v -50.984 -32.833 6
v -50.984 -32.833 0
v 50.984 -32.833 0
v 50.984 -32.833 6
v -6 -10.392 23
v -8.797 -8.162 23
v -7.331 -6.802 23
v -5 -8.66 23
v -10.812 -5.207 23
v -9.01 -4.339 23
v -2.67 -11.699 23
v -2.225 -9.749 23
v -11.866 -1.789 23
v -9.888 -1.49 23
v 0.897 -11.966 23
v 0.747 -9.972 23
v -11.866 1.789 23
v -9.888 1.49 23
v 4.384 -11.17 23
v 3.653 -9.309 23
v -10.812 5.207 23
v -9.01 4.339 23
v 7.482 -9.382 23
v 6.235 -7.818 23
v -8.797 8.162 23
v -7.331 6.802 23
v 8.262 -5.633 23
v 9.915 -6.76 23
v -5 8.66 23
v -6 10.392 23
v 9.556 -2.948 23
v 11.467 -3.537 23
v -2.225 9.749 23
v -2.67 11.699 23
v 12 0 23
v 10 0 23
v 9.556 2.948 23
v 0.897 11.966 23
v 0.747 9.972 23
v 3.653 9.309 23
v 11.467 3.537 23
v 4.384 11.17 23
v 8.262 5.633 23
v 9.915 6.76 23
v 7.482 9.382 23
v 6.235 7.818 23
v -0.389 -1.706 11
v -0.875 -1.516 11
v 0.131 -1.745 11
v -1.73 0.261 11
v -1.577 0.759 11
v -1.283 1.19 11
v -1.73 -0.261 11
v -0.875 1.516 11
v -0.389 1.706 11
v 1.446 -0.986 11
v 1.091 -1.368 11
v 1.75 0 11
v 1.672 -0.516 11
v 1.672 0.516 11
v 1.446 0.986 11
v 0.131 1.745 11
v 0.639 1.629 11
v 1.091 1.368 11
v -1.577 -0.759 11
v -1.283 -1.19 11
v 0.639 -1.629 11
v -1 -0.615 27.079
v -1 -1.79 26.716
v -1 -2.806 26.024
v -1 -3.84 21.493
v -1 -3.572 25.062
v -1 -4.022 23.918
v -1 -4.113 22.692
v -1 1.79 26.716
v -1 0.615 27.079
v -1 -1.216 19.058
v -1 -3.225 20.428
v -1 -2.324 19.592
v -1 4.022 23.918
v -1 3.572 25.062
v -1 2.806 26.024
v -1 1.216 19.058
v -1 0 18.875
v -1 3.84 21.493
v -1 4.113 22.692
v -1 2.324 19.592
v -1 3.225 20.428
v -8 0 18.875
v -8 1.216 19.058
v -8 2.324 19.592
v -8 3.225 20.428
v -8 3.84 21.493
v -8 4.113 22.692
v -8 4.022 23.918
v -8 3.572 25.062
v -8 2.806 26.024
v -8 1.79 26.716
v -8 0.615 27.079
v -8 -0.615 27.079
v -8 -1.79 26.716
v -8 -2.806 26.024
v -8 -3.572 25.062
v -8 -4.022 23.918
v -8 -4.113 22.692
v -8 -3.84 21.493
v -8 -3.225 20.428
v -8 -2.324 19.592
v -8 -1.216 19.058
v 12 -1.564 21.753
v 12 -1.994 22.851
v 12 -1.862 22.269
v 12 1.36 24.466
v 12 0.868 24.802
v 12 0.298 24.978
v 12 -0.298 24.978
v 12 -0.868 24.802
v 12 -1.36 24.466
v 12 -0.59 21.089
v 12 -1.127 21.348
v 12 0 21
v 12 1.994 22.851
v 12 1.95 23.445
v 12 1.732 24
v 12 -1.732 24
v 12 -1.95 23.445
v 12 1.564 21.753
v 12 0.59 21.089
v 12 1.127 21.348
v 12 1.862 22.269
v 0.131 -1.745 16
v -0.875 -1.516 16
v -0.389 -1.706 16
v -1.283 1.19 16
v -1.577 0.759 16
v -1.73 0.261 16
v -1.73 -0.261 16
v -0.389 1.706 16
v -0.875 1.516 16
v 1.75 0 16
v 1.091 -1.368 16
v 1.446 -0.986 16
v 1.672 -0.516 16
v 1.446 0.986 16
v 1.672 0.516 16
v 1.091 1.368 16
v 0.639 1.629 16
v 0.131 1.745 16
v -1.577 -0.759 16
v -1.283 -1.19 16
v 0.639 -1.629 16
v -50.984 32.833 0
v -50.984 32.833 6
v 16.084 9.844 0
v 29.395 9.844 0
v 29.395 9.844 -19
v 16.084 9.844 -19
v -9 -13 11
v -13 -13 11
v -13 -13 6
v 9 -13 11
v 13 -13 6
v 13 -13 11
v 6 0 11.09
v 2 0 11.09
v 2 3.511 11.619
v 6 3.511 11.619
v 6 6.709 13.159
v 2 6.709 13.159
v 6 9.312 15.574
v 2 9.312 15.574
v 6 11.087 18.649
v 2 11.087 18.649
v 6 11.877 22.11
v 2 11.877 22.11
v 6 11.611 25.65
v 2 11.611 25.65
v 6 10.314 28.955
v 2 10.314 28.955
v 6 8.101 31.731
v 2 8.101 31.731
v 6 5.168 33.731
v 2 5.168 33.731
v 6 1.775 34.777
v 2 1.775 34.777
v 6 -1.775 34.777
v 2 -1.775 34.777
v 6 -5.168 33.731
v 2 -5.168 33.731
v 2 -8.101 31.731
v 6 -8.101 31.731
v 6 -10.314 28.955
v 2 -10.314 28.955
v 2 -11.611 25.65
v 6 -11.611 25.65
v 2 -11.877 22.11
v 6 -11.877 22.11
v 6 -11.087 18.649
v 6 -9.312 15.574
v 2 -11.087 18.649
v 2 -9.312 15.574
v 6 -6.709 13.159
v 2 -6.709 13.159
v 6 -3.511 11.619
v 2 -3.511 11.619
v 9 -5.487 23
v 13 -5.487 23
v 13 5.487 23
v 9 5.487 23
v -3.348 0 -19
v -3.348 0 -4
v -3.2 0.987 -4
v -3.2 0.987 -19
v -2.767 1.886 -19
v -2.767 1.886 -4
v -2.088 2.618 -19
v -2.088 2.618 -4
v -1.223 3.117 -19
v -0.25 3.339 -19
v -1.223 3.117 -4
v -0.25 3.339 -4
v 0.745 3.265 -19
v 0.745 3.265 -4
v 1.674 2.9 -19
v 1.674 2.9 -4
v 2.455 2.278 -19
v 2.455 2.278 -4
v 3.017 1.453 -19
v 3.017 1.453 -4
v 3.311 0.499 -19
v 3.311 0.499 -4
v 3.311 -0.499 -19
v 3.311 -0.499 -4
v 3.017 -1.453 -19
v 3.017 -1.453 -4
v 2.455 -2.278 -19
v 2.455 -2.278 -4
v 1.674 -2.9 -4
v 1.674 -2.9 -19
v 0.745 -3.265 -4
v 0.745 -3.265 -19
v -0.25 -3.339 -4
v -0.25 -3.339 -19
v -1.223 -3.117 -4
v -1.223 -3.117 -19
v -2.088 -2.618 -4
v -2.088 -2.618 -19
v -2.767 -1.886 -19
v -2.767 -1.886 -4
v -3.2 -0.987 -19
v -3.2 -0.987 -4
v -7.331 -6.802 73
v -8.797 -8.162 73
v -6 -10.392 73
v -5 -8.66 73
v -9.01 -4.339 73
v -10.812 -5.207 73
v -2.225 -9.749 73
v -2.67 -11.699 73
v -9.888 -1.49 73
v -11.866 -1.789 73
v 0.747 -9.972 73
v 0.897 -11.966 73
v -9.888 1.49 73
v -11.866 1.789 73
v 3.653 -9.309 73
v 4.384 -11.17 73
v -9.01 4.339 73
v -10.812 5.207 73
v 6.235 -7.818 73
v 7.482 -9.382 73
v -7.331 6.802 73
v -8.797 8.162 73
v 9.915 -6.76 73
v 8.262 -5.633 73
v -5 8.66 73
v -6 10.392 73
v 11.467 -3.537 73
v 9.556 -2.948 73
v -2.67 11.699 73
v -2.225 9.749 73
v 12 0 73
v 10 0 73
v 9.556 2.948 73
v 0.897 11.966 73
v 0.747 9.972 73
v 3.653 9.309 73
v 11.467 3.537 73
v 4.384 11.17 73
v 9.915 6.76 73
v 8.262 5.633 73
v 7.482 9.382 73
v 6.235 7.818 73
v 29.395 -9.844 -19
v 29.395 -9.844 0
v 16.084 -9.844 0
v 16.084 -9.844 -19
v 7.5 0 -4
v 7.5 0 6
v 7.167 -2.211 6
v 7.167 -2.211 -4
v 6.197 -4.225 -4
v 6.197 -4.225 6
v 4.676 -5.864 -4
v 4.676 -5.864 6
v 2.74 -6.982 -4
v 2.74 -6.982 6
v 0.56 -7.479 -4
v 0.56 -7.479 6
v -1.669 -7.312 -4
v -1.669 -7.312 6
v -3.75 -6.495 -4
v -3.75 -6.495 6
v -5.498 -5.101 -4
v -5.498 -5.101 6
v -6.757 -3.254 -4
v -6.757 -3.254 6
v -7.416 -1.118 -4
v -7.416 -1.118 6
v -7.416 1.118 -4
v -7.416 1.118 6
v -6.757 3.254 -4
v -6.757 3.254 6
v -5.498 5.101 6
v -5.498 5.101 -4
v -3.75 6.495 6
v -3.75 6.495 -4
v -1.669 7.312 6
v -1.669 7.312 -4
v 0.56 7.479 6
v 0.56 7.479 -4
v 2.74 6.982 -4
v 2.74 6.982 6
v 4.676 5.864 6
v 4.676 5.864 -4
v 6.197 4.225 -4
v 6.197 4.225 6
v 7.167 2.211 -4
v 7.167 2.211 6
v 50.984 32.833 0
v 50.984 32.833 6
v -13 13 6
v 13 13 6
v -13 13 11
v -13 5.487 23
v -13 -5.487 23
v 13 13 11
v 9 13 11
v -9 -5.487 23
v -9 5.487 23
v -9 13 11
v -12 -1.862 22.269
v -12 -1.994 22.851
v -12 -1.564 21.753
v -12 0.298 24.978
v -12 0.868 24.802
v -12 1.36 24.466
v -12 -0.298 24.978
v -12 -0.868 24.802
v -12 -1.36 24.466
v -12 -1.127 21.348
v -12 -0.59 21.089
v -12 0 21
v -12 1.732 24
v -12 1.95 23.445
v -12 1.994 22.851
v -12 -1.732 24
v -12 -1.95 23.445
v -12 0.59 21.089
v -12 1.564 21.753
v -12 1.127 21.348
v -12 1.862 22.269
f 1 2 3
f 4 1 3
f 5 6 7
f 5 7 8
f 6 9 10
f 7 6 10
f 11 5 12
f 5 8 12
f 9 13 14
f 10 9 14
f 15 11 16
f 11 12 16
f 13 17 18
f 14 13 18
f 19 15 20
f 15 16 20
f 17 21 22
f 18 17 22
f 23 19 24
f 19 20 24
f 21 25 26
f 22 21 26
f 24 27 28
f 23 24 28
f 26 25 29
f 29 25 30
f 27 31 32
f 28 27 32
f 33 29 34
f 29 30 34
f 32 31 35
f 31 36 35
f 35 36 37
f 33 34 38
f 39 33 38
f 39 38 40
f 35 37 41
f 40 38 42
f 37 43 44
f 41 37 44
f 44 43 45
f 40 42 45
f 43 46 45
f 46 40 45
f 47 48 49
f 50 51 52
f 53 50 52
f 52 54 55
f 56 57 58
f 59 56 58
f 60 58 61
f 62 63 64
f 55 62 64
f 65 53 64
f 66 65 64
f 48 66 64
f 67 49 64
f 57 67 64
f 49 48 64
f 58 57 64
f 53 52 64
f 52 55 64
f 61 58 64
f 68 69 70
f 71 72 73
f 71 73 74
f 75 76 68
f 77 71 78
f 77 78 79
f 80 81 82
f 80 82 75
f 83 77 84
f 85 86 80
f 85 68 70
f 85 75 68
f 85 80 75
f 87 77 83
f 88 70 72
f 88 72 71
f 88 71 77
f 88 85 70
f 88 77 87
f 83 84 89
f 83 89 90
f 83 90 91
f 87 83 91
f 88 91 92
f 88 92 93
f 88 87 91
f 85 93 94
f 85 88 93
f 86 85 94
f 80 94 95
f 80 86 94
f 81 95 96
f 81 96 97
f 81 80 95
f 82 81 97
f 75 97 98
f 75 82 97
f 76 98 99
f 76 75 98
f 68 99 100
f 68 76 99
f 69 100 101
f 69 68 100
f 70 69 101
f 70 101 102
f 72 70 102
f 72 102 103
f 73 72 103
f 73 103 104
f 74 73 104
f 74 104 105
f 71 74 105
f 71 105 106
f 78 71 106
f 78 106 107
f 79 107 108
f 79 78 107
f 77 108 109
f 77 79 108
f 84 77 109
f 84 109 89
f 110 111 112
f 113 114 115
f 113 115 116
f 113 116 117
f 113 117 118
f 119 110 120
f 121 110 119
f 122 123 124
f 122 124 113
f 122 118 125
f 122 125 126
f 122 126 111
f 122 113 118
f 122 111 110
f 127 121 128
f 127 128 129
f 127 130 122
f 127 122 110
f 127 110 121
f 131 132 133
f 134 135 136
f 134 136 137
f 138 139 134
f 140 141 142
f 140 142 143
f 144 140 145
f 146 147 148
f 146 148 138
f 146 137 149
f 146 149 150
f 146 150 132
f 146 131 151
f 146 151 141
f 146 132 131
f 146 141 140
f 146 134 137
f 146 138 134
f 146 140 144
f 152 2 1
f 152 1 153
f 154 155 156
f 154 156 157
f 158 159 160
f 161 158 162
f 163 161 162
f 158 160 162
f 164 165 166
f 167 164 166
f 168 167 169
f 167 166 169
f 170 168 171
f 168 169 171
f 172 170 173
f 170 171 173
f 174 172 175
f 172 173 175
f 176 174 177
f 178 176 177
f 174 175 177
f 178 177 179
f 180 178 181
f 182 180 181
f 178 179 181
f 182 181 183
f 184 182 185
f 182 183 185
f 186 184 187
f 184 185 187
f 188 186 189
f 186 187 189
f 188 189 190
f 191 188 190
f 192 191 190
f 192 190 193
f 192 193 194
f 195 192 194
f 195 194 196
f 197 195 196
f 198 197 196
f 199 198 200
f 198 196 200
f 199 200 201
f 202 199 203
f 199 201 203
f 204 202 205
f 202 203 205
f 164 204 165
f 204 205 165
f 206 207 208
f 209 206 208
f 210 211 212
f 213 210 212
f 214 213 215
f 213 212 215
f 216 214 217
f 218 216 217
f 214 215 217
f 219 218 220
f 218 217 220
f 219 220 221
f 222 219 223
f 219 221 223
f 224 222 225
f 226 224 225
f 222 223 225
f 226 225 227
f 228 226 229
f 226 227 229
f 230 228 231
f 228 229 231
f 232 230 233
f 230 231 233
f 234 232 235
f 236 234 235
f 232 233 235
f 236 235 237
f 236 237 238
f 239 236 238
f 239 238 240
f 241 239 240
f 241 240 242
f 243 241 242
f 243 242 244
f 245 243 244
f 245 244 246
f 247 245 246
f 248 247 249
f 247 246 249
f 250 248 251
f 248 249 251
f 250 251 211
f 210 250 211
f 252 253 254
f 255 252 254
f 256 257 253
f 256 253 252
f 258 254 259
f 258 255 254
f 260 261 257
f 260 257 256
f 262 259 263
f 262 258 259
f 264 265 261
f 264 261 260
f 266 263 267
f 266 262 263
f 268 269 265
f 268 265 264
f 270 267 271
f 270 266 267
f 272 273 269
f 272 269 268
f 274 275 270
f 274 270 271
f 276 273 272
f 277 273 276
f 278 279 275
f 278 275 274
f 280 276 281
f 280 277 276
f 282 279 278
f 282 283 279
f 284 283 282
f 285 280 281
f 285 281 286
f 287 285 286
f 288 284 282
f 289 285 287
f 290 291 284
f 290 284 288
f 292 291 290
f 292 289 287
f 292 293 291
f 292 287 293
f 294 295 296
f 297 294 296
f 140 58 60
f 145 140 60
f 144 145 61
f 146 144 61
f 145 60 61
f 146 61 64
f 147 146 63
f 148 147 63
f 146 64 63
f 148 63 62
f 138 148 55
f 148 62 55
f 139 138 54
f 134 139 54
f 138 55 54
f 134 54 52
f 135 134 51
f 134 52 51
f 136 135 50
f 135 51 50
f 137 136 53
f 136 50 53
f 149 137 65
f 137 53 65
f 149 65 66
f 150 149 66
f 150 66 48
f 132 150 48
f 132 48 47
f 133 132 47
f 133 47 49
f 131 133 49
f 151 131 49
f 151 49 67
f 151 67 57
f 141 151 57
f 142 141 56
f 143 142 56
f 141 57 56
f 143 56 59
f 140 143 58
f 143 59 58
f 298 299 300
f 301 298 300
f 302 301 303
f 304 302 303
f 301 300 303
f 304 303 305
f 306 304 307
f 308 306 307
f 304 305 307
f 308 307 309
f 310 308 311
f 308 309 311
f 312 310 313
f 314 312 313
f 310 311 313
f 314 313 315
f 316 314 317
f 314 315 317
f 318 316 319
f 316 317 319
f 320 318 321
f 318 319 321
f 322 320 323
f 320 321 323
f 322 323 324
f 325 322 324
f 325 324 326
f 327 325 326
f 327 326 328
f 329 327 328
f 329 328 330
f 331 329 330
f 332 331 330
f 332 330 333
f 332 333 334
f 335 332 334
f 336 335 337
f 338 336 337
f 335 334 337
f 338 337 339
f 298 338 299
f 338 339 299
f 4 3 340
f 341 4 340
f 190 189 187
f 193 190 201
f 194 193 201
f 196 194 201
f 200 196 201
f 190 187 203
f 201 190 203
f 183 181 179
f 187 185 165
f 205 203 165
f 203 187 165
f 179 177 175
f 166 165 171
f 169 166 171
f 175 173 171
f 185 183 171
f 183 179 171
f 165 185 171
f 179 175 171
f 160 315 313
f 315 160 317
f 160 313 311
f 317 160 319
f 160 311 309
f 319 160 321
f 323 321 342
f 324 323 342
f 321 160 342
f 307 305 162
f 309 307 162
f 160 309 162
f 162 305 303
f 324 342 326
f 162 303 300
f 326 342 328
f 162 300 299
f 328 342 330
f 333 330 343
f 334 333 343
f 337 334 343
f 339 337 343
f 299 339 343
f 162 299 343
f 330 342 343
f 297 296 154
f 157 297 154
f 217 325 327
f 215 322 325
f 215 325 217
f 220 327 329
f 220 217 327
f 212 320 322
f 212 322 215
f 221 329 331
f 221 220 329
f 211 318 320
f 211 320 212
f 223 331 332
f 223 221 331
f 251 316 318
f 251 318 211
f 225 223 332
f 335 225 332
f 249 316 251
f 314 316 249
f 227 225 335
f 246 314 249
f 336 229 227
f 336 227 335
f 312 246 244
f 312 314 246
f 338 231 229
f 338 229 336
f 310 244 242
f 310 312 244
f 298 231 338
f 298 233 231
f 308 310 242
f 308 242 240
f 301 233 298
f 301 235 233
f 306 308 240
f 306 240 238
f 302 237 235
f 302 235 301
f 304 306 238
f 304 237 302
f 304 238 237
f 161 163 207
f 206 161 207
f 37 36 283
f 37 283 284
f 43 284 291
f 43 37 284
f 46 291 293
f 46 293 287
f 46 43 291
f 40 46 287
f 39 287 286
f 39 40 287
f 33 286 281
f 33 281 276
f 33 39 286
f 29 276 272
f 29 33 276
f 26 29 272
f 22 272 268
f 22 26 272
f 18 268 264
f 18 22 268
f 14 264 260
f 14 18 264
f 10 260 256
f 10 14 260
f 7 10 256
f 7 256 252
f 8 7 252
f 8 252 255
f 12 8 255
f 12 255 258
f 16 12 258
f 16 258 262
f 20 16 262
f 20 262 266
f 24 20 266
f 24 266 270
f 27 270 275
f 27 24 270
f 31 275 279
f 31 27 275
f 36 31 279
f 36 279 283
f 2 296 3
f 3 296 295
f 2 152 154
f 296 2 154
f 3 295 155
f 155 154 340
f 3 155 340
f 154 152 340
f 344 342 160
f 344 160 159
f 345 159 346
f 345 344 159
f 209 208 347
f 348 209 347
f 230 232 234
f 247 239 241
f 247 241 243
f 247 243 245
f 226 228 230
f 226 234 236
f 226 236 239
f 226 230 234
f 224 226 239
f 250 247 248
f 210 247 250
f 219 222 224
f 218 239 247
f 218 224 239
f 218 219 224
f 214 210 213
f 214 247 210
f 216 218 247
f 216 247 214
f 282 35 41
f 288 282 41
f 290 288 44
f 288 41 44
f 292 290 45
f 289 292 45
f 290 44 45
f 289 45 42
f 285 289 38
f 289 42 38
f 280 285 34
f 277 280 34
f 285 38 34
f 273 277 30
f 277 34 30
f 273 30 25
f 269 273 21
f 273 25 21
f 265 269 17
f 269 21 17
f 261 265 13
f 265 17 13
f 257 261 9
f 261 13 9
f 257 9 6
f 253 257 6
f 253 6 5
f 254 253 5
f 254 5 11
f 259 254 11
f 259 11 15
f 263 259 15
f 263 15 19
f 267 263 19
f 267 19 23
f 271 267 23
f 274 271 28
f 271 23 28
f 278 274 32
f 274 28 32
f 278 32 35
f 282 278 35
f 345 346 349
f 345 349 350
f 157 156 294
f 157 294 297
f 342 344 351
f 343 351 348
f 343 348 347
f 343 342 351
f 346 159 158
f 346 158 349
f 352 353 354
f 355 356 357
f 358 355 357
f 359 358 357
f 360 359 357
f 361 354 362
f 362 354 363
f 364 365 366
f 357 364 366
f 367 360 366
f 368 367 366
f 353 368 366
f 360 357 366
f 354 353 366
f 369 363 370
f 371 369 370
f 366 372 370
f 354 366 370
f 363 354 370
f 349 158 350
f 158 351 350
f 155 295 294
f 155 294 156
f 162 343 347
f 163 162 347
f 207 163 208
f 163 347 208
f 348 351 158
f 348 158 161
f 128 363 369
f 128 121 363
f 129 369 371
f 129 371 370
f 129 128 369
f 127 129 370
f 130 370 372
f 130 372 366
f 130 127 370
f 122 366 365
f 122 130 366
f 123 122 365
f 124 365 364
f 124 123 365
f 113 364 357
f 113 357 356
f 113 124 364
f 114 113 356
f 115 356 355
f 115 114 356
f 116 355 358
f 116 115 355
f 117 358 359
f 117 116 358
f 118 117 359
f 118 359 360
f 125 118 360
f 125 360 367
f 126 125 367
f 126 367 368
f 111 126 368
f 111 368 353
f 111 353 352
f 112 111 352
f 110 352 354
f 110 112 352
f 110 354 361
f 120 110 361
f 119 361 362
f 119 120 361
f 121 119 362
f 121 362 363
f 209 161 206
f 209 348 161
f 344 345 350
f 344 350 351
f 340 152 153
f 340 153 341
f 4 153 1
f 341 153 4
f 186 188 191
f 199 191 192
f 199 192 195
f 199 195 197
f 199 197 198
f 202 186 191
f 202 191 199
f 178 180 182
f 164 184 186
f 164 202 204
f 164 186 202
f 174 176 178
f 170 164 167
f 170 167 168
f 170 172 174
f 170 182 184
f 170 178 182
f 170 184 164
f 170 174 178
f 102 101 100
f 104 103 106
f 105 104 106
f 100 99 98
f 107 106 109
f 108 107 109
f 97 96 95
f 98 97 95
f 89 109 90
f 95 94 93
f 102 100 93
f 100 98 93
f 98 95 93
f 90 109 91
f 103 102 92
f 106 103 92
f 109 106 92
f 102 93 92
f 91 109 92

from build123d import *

# Parameters (mm, degrees)
SKETCH4_W            = 101.967936368
SKETCH4_H            = 65.666060288
BOSS_EXTRUDE4_DEPTH  = 6
SKETCH5_W            = 26
SKETCH5_H            = 26
BOSS_EXTRUDE5_DEPTH  = 5
BOSS_EXTRUDE6_DEPTH  = 4
SKETCH7_R            = 12
SKETCH7_R_2          = 10
EXTRUDE_THIN1_DEPTH  = 50
SKETCH8_R            = 1.75
BOSS_EXTRUDE7_DEPTH  = 5
BOSS_EXTRUDE8_START  = 2
SKETCH10_R           = 11.91
BOSS_EXTRUDE8_DEPTH  = 4
SKETCH11_R           = 2
BOSS_EXTRUDE9_DEPTH  = 12
SKETCH13_R           = 7.5
BOSS_EXTRUDE11_DEPTH = 10
BOSS_EXTRUDE12_START = -1
SKETCH14_R           = 4.125
BOSS_EXTRUDE12_DEPTH = 7
SKETCH15_R           = 3.348476615
BOSS_EXTRUDE13_DEPTH = 15
SKETCH16_W           = 13.310717663
SKETCH16_H           = 19.688769876
BOSS_EXTRUDE14_DEPTH = 19


with BuildPart() as part:
    # Sketch4 → Boss-Extrude4 (new body)
    with BuildSketch(Plane.XY):
        Rectangle(SKETCH4_W, SKETCH4_H)
    extrude(amount=BOSS_EXTRUDE4_DEPTH)

    # Sketch16 → Boss-Extrude14 (add)
    with BuildSketch(Plane(origin=(0, 0, 0), x_dir=(-1, 0, 0), z_dir=(0, 0, -1))):
        with Locations((-22.739142675, 0)):
            Rectangle(SKETCH16_W, SKETCH16_H)
    extrude(amount=BOSS_EXTRUDE14_DEPTH)


with BuildPart() as body_2:
    # Sketch5 → Boss-Extrude5 (new body)
    with BuildSketch(Plane.XY.offset(6)):
        Rectangle(SKETCH5_W, SKETCH5_H)
    extrude(amount=BOSS_EXTRUDE5_DEPTH)

    # Sketch6 → Boss-Extrude6 (add)
    with BuildSketch(Plane(origin=(13, 0, 0), x_dir=(0, 0, -1), z_dir=(1, 0, 0))):
        Polygon((-11, -13), (-23, -5.486969756), (-23, 5.486969756), (-11, 13), align=None)
    boss_extrude6 = extrude(amount=-BOSS_EXTRUDE6_DEPTH)

    # Mirror1: Boss-Extrude6 across plane
    add(boss_extrude6.mirror(Plane(origin=(0, 0, 0), x_dir=(0, 0, 1), z_dir=(1, 0, 0))))

    # Sketch13 → Boss-Extrude11 (add)
    with BuildSketch(Plane(origin=(0, 0, 6), x_dir=(-1, 0, 0), z_dir=(0, 0, -1))):
        with Locations(Location((0, 0, 0), (0, 0, 180))):
            Circle(SKETCH13_R)
    extrude(amount=BOSS_EXTRUDE11_DEPTH)

    # Sketch15 → Boss-Extrude13 (add)
    with BuildSketch(Plane(origin=(0, 0, -4), x_dir=(-1, 0, 0), z_dir=(0, 0, -1))):
        Circle(SKETCH15_R)
    extrude(amount=BOSS_EXTRUDE13_DEPTH)


with BuildPart() as body_3:
    # Sketch7 → Extrude-Thin1 (new body)
    with BuildSketch(Plane.XY.offset(23)):
        Circle(SKETCH7_R)
        Circle(SKETCH7_R_2, mode=Mode.SUBTRACT)
    extrude(amount=EXTRUDE_THIN1_DEPTH)


with BuildPart() as body_4:
    # Sketch8 → Boss-Extrude7 (new body)
    with BuildSketch(Plane.XY.offset(11)):
        Circle(SKETCH8_R)
    extrude(amount=BOSS_EXTRUDE7_DEPTH)


with BuildPart() as body_5:
    # Sketch10 → Boss-Extrude8 (new body)
    with BuildSketch(Plane(origin=(0, 0, 0), x_dir=(0, 0, -1), z_dir=(1, 0, 0)).offset(BOSS_EXTRUDE8_START)):
        with Locations((-23, 0)):
            Circle(SKETCH10_R)
    extrude(amount=BOSS_EXTRUDE8_DEPTH)


with BuildPart() as body_6:
    # Sketch11 → Boss-Extrude9 (new, symmetric)
    with BuildSketch(Plane(origin=(0, 0, 0), x_dir=(0, 0, -1), z_dir=(1, 0, 0))):
        with Locations((-23, 0)):
            Circle(SKETCH11_R)
    extrude(amount=BOSS_EXTRUDE9_DEPTH, both=True)


with BuildPart() as body_7:
    # Sketch14 → Boss-Extrude12 (new body)
    with BuildSketch(Plane(origin=(0, 0, 0), x_dir=(0, 0, -1), z_dir=(1, 0, 0)).offset(BOSS_EXTRUDE12_START)):
        with Locations((-23, 0)):
            Circle(SKETCH14_R)
    extrude(amount=-BOSS_EXTRUDE12_DEPTH)


solid = Compound([part.part, body_2.part, body_3.part, body_4.part, body_5.part, body_6.part, body_7.part])
